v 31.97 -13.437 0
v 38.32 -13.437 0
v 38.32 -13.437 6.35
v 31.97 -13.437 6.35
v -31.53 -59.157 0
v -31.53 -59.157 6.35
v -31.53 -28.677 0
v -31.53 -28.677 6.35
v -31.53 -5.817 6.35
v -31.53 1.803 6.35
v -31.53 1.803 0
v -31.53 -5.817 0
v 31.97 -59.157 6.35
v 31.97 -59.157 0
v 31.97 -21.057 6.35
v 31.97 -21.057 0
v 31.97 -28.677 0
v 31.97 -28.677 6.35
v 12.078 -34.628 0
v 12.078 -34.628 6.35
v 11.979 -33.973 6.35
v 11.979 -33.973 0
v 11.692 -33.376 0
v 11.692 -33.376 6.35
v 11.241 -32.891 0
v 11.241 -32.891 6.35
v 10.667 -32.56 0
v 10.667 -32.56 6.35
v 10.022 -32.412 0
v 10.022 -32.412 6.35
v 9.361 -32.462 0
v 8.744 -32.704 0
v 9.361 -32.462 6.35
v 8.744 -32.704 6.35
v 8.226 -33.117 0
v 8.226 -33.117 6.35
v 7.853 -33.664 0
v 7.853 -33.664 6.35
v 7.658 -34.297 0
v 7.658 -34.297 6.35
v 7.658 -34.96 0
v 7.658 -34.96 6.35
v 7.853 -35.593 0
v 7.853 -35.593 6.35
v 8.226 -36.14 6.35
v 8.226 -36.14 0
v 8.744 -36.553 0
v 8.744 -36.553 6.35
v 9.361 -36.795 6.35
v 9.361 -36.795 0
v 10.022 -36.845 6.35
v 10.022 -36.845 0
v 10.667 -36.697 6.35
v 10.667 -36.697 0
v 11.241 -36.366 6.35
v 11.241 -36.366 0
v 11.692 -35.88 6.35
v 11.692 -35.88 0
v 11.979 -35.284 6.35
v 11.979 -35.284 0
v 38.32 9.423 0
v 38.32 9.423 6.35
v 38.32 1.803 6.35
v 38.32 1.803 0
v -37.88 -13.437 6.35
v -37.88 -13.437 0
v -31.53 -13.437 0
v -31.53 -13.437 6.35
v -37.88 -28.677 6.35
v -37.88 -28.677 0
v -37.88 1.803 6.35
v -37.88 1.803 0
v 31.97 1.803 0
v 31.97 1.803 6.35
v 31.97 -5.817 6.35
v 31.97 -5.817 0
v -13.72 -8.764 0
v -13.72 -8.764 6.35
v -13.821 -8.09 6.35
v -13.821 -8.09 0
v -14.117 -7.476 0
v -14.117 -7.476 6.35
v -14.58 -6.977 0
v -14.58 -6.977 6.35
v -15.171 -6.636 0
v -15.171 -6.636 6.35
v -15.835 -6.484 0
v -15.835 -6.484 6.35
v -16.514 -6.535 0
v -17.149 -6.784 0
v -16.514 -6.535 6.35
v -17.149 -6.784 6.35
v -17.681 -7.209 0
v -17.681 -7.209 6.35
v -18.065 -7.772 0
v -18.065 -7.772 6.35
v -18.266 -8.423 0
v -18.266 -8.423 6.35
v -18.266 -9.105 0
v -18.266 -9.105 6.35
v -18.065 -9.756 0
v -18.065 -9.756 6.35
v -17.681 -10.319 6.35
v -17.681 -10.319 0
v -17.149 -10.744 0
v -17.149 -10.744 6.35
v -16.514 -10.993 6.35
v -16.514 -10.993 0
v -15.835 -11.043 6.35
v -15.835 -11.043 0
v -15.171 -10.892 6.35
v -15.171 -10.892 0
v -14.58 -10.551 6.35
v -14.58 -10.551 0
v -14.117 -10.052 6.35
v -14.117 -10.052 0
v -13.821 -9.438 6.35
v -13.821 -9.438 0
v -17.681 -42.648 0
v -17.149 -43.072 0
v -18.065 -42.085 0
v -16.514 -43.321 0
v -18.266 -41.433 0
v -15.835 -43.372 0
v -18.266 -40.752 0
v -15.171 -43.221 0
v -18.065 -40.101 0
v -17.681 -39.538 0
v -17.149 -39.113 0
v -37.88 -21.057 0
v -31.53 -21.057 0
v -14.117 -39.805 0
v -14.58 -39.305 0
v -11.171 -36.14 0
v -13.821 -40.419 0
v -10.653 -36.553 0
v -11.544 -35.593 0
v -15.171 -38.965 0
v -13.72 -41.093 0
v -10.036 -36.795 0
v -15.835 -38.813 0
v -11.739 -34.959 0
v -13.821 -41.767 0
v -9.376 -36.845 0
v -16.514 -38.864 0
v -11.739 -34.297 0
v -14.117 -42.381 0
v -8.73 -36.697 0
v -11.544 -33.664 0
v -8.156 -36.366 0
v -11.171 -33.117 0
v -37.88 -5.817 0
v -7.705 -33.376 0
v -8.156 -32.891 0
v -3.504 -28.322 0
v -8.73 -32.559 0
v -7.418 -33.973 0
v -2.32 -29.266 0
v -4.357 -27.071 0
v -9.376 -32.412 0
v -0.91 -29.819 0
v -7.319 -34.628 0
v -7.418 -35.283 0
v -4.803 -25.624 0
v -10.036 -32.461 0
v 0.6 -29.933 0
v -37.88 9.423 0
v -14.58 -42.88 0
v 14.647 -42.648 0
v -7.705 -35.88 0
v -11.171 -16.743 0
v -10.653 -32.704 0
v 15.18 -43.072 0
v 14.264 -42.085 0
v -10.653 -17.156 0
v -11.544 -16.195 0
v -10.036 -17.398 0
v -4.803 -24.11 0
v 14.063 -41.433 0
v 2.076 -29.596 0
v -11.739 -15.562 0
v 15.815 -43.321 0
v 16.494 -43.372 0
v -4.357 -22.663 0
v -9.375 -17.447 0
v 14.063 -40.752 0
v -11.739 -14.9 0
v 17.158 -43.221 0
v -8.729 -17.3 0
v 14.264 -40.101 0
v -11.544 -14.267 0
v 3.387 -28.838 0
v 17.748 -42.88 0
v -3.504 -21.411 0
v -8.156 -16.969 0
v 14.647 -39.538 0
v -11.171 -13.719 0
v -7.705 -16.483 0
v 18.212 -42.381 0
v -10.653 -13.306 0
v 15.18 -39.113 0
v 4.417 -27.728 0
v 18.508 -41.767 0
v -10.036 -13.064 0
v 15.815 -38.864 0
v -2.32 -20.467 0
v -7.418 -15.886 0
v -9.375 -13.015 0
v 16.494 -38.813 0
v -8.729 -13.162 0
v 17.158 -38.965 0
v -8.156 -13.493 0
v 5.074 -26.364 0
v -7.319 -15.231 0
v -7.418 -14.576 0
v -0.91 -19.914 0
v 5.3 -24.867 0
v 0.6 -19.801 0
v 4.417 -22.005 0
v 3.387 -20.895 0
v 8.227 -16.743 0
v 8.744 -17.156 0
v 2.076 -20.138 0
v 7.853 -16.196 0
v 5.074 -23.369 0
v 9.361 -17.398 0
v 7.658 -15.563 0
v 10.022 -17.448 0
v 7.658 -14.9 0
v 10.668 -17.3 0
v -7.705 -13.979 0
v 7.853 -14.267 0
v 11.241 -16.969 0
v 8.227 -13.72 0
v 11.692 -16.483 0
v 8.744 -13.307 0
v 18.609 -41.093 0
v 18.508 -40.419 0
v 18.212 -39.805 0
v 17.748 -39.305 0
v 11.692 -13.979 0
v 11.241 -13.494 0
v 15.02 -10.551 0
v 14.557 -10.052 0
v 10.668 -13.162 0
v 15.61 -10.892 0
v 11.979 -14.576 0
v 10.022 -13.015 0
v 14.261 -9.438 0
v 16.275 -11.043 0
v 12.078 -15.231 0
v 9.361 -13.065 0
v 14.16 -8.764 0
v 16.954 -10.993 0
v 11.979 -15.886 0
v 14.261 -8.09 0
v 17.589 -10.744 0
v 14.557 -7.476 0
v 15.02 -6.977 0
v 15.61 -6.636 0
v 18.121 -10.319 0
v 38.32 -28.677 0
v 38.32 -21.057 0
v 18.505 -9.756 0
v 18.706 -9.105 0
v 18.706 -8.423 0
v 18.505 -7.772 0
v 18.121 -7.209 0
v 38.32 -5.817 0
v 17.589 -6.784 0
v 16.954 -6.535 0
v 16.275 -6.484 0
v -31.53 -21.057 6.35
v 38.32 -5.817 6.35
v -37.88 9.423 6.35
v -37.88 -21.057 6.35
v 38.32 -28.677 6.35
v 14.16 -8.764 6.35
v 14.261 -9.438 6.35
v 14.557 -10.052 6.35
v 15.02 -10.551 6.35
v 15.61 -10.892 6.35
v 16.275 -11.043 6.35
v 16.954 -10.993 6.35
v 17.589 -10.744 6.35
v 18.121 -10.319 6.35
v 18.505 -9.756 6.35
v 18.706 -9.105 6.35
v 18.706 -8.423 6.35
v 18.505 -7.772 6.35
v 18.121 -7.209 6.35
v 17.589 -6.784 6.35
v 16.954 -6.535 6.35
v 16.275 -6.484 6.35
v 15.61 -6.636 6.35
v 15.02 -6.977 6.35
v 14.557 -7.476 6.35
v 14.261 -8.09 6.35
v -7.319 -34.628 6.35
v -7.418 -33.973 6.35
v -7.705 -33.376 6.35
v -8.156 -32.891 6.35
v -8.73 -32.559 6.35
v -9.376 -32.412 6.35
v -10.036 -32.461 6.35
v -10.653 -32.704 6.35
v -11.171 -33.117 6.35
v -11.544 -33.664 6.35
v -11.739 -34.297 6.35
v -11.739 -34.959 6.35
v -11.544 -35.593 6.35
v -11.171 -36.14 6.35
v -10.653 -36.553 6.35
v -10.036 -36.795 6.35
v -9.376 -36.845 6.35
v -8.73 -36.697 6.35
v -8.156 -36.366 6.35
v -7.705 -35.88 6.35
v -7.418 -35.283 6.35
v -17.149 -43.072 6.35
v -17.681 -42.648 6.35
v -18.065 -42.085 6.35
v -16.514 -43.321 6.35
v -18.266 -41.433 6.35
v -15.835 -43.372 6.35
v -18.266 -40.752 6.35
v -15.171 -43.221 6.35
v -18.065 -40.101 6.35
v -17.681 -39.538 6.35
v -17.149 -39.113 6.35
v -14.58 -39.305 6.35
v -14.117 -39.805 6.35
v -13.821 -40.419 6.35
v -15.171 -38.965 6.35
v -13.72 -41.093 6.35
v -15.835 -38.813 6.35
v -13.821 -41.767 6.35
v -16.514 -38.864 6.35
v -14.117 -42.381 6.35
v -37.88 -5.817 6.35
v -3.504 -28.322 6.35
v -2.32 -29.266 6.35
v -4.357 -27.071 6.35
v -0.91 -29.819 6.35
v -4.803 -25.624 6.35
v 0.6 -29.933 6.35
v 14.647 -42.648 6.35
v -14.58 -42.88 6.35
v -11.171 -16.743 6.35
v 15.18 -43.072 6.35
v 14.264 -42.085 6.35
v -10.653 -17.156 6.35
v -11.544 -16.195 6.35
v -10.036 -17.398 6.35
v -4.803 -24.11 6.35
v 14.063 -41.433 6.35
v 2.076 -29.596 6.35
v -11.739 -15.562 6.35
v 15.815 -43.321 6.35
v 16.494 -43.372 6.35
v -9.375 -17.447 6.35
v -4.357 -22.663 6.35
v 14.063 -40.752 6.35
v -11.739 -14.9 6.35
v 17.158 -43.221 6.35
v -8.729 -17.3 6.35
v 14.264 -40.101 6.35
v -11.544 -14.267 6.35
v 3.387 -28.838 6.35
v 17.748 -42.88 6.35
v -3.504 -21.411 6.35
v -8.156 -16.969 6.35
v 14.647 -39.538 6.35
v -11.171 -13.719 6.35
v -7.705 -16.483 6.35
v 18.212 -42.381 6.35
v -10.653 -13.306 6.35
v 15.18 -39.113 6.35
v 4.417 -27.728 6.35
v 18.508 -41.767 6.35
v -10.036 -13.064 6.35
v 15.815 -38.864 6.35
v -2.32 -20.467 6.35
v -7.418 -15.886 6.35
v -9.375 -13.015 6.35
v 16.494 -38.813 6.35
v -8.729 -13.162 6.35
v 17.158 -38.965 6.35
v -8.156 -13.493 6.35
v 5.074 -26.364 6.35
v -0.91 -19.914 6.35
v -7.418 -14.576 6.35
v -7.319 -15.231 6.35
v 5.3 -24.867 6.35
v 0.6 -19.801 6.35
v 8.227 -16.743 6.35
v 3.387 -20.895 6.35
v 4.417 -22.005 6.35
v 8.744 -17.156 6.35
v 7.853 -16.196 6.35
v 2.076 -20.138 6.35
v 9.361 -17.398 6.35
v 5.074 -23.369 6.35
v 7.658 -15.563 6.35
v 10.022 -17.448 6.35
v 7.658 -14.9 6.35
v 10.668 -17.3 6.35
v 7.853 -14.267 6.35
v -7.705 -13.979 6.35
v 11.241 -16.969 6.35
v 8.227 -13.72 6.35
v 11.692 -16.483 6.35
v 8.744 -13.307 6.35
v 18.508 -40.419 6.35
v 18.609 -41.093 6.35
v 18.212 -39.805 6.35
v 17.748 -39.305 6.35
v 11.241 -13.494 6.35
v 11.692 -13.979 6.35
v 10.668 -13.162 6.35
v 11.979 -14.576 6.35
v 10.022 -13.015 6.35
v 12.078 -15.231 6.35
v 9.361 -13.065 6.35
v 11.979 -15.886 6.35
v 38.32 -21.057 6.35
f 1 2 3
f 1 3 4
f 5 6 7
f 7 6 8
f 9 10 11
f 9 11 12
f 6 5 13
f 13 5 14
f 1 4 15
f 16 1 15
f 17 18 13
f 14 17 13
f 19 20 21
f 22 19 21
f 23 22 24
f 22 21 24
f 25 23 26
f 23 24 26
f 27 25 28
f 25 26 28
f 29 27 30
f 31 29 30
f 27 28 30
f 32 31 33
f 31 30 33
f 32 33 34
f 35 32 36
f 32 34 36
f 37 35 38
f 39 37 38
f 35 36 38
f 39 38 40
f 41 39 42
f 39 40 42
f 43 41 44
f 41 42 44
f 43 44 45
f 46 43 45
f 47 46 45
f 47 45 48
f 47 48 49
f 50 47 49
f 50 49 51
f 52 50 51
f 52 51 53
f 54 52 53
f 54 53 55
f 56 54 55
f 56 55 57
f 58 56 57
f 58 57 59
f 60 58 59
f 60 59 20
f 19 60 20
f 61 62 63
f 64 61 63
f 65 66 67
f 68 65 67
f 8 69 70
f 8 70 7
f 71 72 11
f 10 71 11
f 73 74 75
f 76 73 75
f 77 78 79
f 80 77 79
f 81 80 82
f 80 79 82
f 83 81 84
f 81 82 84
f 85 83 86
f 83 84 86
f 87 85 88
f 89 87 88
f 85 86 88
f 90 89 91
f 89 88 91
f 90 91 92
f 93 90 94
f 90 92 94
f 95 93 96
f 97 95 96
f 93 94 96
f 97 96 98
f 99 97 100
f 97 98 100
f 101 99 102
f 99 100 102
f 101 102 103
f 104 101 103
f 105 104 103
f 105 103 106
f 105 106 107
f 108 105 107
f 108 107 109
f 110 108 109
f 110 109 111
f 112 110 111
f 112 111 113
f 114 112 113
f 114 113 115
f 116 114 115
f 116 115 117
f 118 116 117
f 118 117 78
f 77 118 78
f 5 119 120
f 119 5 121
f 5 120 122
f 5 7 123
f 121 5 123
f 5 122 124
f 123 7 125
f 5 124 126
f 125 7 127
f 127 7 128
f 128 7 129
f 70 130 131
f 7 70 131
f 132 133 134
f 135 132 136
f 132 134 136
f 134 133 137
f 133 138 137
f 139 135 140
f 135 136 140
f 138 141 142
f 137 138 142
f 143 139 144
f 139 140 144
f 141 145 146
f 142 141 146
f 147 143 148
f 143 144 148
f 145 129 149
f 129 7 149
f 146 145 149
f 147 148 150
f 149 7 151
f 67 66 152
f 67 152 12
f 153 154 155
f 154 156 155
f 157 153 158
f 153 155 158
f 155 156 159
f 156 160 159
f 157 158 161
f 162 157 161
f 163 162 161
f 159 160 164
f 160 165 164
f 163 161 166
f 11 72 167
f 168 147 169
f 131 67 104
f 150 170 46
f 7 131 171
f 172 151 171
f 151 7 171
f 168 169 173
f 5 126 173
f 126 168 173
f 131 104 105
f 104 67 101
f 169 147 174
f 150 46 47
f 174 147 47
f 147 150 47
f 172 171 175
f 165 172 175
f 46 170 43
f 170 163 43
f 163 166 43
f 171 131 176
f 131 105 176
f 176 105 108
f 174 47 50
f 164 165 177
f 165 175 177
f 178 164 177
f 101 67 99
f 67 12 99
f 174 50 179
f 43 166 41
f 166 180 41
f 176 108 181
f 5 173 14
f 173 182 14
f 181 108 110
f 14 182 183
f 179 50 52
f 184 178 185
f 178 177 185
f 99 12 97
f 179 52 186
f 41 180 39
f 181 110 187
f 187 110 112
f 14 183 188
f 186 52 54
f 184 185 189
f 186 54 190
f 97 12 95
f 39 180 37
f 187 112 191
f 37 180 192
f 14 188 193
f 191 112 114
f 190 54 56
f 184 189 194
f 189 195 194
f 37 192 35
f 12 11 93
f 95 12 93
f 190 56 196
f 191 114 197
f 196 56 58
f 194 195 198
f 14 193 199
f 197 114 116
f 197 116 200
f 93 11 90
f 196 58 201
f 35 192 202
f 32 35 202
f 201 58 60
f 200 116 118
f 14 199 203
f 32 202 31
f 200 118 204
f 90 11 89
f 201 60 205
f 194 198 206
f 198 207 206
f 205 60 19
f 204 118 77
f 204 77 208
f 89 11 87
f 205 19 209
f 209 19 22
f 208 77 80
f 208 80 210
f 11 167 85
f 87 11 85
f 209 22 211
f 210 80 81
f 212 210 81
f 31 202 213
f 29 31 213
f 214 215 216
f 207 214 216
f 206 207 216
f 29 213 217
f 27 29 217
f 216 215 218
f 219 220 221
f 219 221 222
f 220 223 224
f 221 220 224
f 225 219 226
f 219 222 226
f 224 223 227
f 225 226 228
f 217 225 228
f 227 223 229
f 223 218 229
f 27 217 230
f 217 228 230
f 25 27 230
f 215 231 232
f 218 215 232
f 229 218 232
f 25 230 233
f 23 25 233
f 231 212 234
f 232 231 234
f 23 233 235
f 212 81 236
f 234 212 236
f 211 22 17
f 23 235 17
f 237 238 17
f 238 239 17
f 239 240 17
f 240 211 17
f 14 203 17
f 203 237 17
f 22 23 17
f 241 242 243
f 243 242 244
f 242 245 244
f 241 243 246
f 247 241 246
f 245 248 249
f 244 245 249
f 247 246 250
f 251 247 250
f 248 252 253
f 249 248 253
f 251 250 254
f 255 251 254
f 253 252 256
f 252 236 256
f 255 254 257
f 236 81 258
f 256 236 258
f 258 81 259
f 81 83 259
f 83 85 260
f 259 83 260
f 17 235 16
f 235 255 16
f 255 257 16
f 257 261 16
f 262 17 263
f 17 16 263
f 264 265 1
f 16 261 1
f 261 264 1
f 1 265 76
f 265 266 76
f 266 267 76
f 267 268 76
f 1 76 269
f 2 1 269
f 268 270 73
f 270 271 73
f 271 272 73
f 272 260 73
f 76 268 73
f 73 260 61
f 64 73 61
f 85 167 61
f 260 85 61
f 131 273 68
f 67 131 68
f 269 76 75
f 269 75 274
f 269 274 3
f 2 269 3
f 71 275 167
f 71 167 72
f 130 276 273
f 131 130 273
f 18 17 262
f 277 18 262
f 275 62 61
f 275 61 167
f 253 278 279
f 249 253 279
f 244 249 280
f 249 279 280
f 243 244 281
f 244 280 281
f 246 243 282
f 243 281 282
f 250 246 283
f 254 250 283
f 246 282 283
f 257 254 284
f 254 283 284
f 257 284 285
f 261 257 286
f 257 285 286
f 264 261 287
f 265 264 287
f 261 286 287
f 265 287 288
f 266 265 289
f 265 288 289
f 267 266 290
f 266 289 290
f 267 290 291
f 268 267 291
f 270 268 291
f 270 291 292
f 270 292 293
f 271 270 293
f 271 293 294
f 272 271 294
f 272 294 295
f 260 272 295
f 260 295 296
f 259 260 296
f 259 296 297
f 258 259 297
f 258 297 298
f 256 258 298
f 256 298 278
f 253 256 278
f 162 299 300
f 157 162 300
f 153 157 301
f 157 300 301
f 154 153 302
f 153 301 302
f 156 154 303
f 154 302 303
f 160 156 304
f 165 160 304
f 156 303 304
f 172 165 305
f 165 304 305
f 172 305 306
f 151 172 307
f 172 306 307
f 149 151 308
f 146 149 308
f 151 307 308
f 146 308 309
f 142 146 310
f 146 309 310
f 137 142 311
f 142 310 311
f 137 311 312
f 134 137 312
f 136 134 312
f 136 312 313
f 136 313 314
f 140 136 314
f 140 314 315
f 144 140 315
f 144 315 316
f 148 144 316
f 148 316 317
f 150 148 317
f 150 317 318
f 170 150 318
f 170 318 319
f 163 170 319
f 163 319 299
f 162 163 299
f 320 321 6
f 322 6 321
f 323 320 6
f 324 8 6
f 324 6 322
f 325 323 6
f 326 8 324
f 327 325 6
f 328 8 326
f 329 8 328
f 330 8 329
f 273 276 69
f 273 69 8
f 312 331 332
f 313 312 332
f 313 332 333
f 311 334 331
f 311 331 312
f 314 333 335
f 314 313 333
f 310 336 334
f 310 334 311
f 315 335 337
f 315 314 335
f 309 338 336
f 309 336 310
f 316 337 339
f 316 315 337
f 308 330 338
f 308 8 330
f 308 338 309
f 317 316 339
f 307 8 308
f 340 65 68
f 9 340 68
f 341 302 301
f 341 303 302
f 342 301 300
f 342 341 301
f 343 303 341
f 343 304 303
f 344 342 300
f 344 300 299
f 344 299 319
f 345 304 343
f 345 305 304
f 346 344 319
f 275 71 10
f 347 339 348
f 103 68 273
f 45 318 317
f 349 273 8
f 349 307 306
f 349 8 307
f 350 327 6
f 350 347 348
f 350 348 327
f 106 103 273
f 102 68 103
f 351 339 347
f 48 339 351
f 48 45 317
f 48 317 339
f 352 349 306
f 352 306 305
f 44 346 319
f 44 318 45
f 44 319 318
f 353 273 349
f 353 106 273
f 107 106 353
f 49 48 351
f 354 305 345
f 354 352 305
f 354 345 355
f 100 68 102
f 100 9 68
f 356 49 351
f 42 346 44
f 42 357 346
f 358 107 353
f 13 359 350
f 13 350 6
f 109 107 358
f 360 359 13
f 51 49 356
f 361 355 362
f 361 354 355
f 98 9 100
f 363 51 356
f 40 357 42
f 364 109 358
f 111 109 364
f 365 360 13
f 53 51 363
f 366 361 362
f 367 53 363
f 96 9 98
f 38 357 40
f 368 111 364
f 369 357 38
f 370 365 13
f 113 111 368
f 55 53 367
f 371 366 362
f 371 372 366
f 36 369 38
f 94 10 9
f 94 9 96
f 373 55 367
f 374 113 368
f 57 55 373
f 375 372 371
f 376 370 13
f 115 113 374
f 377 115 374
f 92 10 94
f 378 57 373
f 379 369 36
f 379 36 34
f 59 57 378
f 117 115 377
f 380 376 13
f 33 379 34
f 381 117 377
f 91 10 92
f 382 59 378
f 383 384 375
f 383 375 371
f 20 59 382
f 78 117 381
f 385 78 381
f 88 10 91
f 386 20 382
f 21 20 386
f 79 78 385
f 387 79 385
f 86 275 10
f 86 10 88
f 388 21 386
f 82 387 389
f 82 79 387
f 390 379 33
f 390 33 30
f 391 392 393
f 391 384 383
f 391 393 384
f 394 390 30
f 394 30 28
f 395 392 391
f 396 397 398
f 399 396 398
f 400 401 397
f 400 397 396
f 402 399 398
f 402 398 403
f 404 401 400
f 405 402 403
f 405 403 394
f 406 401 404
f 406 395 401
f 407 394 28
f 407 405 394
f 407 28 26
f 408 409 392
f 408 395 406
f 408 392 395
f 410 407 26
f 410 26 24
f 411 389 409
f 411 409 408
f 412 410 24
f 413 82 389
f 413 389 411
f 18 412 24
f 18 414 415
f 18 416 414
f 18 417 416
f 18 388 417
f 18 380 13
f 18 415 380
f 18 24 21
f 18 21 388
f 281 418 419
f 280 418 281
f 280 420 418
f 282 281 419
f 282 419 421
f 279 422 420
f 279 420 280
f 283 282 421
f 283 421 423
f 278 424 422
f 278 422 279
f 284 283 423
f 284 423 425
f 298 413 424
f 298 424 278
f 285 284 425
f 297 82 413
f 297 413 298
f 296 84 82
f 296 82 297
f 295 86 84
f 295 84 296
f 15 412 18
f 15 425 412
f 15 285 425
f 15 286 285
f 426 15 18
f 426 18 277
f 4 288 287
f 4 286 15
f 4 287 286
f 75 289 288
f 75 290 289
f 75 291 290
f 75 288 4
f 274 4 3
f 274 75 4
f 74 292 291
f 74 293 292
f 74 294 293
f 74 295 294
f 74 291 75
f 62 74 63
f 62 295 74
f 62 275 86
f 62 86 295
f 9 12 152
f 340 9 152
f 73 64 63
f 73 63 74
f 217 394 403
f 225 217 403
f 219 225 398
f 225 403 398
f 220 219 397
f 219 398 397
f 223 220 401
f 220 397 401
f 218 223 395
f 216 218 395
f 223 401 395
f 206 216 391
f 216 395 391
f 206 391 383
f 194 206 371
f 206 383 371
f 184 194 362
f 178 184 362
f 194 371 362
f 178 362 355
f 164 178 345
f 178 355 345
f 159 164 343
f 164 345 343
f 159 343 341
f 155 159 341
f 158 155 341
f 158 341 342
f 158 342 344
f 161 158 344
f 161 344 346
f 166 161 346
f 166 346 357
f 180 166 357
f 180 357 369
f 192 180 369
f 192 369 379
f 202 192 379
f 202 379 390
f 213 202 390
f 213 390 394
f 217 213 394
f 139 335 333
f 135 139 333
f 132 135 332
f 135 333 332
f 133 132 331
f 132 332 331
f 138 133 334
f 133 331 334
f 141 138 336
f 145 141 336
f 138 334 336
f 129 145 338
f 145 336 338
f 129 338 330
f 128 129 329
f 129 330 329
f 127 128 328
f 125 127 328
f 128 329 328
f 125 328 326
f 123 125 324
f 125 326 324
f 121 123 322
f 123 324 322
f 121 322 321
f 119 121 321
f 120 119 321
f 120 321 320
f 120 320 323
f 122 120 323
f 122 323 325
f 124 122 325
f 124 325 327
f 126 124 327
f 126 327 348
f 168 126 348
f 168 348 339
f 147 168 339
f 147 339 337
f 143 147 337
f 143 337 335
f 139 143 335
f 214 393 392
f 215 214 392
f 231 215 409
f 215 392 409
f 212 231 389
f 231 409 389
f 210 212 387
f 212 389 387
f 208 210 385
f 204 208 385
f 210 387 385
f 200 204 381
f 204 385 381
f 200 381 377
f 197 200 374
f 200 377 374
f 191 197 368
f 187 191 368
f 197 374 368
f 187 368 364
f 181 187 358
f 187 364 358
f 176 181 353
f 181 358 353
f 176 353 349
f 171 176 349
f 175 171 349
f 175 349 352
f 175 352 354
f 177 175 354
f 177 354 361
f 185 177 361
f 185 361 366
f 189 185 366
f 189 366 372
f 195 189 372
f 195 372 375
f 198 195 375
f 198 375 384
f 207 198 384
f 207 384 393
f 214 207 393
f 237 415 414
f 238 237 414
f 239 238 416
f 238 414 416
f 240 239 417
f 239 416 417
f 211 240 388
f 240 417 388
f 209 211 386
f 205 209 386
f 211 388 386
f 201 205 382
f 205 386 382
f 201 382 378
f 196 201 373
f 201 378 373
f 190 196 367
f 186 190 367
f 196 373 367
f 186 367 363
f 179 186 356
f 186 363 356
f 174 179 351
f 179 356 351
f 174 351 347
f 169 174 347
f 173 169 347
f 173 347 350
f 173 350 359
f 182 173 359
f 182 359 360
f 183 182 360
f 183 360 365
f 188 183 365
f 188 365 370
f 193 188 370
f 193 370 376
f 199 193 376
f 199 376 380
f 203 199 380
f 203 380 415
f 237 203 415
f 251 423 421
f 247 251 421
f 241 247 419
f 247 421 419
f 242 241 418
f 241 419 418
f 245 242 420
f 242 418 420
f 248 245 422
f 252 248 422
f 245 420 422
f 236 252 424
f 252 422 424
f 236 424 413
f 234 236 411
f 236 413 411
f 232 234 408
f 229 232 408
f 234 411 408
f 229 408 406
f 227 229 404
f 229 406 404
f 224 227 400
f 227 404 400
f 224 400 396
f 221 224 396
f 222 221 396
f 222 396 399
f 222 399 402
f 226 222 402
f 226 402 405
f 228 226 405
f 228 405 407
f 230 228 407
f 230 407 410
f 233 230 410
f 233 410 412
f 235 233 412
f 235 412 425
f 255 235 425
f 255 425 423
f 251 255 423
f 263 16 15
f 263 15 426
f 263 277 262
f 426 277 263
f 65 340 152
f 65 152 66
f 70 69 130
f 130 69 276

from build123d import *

# Parameters (mm, degrees)
SKETCH1_W           = 76.2
SKETCH1_H           = 76.2
BOSS_EXTRUDE1_DEPTH = 6.35
CUT_EXTRUDE1_DEPTH  = 6.35
SKETCH3_W           = 6.35
SKETCH3_H           = 38.1
CUT_EXTRUDE2_DEPTH  = 6.35
SKETCH4_W           = 6.35
SKETCH4_H           = 7.62
BOSS_EXTRUDE3_DEPTH = 6.35
SKETCH5_W           = 63.5
SKETCH5_H           = 6.35
CUT_EXTRUDE3_DEPTH  = 7.62
SKETCH6_R           = 5.08
SKETCH6_R_2         = 2.2225
SKETCH6_R_3         = 2.286
CUT_EXTRUDE4_DEPTH  = 71.769022866


with BuildPart() as part:
    # Sketch1 → Boss-Extrude1 (new body)
    with BuildSketch(Plane.XY):
        with Locations((0.21991342, -21.056709957)):
            Rectangle(SKETCH1_W, SKETCH1_H)
    extrude(amount=BOSS_EXTRUDE1_DEPTH)

    # Sketch2 → Cut-Extrude1 (cut)
    with BuildSketch(Plane.XY.offset(6.35)):
        Polygon((-37.88008658, 17.043290043), (-31.53008658, 17.043290043), (-31.53008658, 9.423290043), (-37.88008658, 9.423290043), (-37.88008658, 1.803290043), (-31.53008658, 1.803290043), (-31.53008658, -5.816709957), (-37.88008658, -5.816709957), (-37.88008658, -13.436709957), (-31.53008658, -13.436709957), (-31.53008658, -21.056709957), (-37.88008658, -21.056709957), (-46.725849744, -21.056709957), (-46.725849744, 17.043290043), align=None)
        Polygon((47.165676584, -21.056709957), (47.165676584, 17.043290043), (38.31991342, 17.043290043), (31.96991342, 17.043290043), (31.96991342, 9.423290043), (38.31991342, 9.423290043), (38.31991342, 1.803290043), (31.96991342, 1.803290043), (31.96991342, -5.816709957), (38.31991342, -5.816709957), (38.31991342, -13.436709957), (31.96991342, -13.436709957), (31.96991342, -21.056709957), (38.31991342, -21.056709957), align=None)
    extrude(amount=-CUT_EXTRUDE1_DEPTH, mode=Mode.SUBTRACT)

    # Sketch3 → Cut-Extrude2 (cut)
    with BuildSketch(Plane.XY.offset(6.35)):
        with Locations((-34.70508658, -40.106709957)):
            Rectangle(SKETCH3_W, SKETCH3_H)
        with Locations((35.14491342, -40.106709957)):
            Rectangle(SKETCH3_W, SKETCH3_H)
    extrude(amount=-CUT_EXTRUDE2_DEPTH, mode=Mode.SUBTRACT)

    # Sketch4 → Boss-Extrude3 (add)
    with BuildSketch(Plane.XY.offset(6.35)):
        with Locations((-34.70508658, -24.866709957)):
            Rectangle(SKETCH4_W, SKETCH4_H)
        with Locations((35.14491342, -24.866709957)):
            Rectangle(SKETCH4_W, SKETCH4_H)
    extrude(amount=-BOSS_EXTRUDE3_DEPTH)

    # Sketch5 → Cut-Extrude3 (cut)
    with BuildSketch(Plane(origin=(0, 17.043290043, 0), x_dir=(1, 0, 0), z_dir=(0, 1, 0))):
        with Locations((0.21991342, -3.175)):
            Rectangle(SKETCH5_W, SKETCH5_H)
    extrude(amount=-CUT_EXTRUDE3_DEPTH, mode=Mode.SUBTRACT)

    # Sketch6 → Cut-Extrude4 (cut, through all)
    with BuildSketch(Plane.XY.offset(6.35)):
        with Locations((0.21991342, -24.866709957)):
            Circle(SKETCH6_R)
        with Locations((-9.541624984, -34.62824836)):
            Circle(SKETCH6_R_2)
        with Locations((-16.005719951, -8.763829057)):
            Circle(SKETCH6_R_3)
        with Locations((-9.541419951, -15.231097531)):
            Circle(SKETCH6_R_2)
        with Locations((9.855730879, -15.231302564)):
            Circle(SKETCH6_R_2)
        with Locations((9.855525846, -34.628453393)):
            Circle(SKETCH6_R_2)
        with Locations(Location((16.445546791, -8.763829057, 0), (0, 0, 180))):
            Circle(SKETCH6_R_3)
        with Locations((16.323202085, -41.092751093)):
            Circle(SKETCH6_R_3)
        with Locations((-16.005719951, -41.092751093)):
            Circle(SKETCH6_R_3)
    extrude(amount=-CUT_EXTRUDE4_DEPTH, mode=Mode.SUBTRACT)


solid = part.part
